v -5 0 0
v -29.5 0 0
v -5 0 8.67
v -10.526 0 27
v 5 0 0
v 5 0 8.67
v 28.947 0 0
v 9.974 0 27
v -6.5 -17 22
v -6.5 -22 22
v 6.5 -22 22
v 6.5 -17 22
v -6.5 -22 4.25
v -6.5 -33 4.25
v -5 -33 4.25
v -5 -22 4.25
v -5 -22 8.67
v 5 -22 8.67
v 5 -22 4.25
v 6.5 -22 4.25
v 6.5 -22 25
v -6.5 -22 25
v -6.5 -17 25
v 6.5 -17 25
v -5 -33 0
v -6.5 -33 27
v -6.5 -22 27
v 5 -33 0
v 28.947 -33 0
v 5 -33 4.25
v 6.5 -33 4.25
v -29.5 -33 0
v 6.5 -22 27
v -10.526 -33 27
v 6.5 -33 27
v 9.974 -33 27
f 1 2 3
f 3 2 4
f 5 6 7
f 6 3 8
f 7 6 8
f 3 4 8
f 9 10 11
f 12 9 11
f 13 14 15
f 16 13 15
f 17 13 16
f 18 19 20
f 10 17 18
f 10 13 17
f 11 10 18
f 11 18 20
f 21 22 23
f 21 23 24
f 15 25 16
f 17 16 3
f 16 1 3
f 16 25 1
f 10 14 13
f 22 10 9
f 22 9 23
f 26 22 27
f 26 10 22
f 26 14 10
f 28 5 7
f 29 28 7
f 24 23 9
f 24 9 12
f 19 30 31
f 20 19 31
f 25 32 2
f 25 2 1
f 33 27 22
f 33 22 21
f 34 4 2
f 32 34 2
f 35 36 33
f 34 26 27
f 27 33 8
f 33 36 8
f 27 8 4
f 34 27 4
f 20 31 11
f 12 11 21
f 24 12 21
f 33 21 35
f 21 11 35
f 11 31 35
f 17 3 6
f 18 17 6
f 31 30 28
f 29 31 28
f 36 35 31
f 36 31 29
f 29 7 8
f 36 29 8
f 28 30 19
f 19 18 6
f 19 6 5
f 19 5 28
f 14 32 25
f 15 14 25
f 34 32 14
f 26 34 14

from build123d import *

# Parameters (mm, degrees)
F1_DEPTH = 33
F2_W     = 13
F2_H     = 22.75
F3_DEPTH = 11
F4_W     = 13
F4_H     = 3
F5_DEPTH = 5


# Not quite as in the source:
# - a feature of the source that left no trace in its solid (it failed there, or was rolled back) is left out


with BuildPart() as f1:
    # F0 (on Front) → F1 (new body)
    with BuildSketch(Plane.XZ):
        Polygon((-10.526334039, 27), (-29.5, 0), (-5, 0), (-5, 8.67), (5, 8.67), (5, 0), (28.947331922, 0), (9.973665961, 27), align=None)
    extrude(amount=F1_DEPTH)

    # F2 (on face) → F3 (cut)
    with BuildSketch(Plane.XZ.offset(33)):
        with Locations((0, 15.625)):
            Rectangle(F2_W, F2_H)
    extrude(amount=-F3_DEPTH, mode=Mode.SUBTRACT)

    # F4 (on face) → F5 (cut)
    with BuildSketch(Plane.XZ.offset(22)):
        with Locations((0, 23.5)):
            Rectangle(F4_W, F4_H)
    extrude(amount=-F5_DEPTH, mode=Mode.SUBTRACT)


solid = f1.part
